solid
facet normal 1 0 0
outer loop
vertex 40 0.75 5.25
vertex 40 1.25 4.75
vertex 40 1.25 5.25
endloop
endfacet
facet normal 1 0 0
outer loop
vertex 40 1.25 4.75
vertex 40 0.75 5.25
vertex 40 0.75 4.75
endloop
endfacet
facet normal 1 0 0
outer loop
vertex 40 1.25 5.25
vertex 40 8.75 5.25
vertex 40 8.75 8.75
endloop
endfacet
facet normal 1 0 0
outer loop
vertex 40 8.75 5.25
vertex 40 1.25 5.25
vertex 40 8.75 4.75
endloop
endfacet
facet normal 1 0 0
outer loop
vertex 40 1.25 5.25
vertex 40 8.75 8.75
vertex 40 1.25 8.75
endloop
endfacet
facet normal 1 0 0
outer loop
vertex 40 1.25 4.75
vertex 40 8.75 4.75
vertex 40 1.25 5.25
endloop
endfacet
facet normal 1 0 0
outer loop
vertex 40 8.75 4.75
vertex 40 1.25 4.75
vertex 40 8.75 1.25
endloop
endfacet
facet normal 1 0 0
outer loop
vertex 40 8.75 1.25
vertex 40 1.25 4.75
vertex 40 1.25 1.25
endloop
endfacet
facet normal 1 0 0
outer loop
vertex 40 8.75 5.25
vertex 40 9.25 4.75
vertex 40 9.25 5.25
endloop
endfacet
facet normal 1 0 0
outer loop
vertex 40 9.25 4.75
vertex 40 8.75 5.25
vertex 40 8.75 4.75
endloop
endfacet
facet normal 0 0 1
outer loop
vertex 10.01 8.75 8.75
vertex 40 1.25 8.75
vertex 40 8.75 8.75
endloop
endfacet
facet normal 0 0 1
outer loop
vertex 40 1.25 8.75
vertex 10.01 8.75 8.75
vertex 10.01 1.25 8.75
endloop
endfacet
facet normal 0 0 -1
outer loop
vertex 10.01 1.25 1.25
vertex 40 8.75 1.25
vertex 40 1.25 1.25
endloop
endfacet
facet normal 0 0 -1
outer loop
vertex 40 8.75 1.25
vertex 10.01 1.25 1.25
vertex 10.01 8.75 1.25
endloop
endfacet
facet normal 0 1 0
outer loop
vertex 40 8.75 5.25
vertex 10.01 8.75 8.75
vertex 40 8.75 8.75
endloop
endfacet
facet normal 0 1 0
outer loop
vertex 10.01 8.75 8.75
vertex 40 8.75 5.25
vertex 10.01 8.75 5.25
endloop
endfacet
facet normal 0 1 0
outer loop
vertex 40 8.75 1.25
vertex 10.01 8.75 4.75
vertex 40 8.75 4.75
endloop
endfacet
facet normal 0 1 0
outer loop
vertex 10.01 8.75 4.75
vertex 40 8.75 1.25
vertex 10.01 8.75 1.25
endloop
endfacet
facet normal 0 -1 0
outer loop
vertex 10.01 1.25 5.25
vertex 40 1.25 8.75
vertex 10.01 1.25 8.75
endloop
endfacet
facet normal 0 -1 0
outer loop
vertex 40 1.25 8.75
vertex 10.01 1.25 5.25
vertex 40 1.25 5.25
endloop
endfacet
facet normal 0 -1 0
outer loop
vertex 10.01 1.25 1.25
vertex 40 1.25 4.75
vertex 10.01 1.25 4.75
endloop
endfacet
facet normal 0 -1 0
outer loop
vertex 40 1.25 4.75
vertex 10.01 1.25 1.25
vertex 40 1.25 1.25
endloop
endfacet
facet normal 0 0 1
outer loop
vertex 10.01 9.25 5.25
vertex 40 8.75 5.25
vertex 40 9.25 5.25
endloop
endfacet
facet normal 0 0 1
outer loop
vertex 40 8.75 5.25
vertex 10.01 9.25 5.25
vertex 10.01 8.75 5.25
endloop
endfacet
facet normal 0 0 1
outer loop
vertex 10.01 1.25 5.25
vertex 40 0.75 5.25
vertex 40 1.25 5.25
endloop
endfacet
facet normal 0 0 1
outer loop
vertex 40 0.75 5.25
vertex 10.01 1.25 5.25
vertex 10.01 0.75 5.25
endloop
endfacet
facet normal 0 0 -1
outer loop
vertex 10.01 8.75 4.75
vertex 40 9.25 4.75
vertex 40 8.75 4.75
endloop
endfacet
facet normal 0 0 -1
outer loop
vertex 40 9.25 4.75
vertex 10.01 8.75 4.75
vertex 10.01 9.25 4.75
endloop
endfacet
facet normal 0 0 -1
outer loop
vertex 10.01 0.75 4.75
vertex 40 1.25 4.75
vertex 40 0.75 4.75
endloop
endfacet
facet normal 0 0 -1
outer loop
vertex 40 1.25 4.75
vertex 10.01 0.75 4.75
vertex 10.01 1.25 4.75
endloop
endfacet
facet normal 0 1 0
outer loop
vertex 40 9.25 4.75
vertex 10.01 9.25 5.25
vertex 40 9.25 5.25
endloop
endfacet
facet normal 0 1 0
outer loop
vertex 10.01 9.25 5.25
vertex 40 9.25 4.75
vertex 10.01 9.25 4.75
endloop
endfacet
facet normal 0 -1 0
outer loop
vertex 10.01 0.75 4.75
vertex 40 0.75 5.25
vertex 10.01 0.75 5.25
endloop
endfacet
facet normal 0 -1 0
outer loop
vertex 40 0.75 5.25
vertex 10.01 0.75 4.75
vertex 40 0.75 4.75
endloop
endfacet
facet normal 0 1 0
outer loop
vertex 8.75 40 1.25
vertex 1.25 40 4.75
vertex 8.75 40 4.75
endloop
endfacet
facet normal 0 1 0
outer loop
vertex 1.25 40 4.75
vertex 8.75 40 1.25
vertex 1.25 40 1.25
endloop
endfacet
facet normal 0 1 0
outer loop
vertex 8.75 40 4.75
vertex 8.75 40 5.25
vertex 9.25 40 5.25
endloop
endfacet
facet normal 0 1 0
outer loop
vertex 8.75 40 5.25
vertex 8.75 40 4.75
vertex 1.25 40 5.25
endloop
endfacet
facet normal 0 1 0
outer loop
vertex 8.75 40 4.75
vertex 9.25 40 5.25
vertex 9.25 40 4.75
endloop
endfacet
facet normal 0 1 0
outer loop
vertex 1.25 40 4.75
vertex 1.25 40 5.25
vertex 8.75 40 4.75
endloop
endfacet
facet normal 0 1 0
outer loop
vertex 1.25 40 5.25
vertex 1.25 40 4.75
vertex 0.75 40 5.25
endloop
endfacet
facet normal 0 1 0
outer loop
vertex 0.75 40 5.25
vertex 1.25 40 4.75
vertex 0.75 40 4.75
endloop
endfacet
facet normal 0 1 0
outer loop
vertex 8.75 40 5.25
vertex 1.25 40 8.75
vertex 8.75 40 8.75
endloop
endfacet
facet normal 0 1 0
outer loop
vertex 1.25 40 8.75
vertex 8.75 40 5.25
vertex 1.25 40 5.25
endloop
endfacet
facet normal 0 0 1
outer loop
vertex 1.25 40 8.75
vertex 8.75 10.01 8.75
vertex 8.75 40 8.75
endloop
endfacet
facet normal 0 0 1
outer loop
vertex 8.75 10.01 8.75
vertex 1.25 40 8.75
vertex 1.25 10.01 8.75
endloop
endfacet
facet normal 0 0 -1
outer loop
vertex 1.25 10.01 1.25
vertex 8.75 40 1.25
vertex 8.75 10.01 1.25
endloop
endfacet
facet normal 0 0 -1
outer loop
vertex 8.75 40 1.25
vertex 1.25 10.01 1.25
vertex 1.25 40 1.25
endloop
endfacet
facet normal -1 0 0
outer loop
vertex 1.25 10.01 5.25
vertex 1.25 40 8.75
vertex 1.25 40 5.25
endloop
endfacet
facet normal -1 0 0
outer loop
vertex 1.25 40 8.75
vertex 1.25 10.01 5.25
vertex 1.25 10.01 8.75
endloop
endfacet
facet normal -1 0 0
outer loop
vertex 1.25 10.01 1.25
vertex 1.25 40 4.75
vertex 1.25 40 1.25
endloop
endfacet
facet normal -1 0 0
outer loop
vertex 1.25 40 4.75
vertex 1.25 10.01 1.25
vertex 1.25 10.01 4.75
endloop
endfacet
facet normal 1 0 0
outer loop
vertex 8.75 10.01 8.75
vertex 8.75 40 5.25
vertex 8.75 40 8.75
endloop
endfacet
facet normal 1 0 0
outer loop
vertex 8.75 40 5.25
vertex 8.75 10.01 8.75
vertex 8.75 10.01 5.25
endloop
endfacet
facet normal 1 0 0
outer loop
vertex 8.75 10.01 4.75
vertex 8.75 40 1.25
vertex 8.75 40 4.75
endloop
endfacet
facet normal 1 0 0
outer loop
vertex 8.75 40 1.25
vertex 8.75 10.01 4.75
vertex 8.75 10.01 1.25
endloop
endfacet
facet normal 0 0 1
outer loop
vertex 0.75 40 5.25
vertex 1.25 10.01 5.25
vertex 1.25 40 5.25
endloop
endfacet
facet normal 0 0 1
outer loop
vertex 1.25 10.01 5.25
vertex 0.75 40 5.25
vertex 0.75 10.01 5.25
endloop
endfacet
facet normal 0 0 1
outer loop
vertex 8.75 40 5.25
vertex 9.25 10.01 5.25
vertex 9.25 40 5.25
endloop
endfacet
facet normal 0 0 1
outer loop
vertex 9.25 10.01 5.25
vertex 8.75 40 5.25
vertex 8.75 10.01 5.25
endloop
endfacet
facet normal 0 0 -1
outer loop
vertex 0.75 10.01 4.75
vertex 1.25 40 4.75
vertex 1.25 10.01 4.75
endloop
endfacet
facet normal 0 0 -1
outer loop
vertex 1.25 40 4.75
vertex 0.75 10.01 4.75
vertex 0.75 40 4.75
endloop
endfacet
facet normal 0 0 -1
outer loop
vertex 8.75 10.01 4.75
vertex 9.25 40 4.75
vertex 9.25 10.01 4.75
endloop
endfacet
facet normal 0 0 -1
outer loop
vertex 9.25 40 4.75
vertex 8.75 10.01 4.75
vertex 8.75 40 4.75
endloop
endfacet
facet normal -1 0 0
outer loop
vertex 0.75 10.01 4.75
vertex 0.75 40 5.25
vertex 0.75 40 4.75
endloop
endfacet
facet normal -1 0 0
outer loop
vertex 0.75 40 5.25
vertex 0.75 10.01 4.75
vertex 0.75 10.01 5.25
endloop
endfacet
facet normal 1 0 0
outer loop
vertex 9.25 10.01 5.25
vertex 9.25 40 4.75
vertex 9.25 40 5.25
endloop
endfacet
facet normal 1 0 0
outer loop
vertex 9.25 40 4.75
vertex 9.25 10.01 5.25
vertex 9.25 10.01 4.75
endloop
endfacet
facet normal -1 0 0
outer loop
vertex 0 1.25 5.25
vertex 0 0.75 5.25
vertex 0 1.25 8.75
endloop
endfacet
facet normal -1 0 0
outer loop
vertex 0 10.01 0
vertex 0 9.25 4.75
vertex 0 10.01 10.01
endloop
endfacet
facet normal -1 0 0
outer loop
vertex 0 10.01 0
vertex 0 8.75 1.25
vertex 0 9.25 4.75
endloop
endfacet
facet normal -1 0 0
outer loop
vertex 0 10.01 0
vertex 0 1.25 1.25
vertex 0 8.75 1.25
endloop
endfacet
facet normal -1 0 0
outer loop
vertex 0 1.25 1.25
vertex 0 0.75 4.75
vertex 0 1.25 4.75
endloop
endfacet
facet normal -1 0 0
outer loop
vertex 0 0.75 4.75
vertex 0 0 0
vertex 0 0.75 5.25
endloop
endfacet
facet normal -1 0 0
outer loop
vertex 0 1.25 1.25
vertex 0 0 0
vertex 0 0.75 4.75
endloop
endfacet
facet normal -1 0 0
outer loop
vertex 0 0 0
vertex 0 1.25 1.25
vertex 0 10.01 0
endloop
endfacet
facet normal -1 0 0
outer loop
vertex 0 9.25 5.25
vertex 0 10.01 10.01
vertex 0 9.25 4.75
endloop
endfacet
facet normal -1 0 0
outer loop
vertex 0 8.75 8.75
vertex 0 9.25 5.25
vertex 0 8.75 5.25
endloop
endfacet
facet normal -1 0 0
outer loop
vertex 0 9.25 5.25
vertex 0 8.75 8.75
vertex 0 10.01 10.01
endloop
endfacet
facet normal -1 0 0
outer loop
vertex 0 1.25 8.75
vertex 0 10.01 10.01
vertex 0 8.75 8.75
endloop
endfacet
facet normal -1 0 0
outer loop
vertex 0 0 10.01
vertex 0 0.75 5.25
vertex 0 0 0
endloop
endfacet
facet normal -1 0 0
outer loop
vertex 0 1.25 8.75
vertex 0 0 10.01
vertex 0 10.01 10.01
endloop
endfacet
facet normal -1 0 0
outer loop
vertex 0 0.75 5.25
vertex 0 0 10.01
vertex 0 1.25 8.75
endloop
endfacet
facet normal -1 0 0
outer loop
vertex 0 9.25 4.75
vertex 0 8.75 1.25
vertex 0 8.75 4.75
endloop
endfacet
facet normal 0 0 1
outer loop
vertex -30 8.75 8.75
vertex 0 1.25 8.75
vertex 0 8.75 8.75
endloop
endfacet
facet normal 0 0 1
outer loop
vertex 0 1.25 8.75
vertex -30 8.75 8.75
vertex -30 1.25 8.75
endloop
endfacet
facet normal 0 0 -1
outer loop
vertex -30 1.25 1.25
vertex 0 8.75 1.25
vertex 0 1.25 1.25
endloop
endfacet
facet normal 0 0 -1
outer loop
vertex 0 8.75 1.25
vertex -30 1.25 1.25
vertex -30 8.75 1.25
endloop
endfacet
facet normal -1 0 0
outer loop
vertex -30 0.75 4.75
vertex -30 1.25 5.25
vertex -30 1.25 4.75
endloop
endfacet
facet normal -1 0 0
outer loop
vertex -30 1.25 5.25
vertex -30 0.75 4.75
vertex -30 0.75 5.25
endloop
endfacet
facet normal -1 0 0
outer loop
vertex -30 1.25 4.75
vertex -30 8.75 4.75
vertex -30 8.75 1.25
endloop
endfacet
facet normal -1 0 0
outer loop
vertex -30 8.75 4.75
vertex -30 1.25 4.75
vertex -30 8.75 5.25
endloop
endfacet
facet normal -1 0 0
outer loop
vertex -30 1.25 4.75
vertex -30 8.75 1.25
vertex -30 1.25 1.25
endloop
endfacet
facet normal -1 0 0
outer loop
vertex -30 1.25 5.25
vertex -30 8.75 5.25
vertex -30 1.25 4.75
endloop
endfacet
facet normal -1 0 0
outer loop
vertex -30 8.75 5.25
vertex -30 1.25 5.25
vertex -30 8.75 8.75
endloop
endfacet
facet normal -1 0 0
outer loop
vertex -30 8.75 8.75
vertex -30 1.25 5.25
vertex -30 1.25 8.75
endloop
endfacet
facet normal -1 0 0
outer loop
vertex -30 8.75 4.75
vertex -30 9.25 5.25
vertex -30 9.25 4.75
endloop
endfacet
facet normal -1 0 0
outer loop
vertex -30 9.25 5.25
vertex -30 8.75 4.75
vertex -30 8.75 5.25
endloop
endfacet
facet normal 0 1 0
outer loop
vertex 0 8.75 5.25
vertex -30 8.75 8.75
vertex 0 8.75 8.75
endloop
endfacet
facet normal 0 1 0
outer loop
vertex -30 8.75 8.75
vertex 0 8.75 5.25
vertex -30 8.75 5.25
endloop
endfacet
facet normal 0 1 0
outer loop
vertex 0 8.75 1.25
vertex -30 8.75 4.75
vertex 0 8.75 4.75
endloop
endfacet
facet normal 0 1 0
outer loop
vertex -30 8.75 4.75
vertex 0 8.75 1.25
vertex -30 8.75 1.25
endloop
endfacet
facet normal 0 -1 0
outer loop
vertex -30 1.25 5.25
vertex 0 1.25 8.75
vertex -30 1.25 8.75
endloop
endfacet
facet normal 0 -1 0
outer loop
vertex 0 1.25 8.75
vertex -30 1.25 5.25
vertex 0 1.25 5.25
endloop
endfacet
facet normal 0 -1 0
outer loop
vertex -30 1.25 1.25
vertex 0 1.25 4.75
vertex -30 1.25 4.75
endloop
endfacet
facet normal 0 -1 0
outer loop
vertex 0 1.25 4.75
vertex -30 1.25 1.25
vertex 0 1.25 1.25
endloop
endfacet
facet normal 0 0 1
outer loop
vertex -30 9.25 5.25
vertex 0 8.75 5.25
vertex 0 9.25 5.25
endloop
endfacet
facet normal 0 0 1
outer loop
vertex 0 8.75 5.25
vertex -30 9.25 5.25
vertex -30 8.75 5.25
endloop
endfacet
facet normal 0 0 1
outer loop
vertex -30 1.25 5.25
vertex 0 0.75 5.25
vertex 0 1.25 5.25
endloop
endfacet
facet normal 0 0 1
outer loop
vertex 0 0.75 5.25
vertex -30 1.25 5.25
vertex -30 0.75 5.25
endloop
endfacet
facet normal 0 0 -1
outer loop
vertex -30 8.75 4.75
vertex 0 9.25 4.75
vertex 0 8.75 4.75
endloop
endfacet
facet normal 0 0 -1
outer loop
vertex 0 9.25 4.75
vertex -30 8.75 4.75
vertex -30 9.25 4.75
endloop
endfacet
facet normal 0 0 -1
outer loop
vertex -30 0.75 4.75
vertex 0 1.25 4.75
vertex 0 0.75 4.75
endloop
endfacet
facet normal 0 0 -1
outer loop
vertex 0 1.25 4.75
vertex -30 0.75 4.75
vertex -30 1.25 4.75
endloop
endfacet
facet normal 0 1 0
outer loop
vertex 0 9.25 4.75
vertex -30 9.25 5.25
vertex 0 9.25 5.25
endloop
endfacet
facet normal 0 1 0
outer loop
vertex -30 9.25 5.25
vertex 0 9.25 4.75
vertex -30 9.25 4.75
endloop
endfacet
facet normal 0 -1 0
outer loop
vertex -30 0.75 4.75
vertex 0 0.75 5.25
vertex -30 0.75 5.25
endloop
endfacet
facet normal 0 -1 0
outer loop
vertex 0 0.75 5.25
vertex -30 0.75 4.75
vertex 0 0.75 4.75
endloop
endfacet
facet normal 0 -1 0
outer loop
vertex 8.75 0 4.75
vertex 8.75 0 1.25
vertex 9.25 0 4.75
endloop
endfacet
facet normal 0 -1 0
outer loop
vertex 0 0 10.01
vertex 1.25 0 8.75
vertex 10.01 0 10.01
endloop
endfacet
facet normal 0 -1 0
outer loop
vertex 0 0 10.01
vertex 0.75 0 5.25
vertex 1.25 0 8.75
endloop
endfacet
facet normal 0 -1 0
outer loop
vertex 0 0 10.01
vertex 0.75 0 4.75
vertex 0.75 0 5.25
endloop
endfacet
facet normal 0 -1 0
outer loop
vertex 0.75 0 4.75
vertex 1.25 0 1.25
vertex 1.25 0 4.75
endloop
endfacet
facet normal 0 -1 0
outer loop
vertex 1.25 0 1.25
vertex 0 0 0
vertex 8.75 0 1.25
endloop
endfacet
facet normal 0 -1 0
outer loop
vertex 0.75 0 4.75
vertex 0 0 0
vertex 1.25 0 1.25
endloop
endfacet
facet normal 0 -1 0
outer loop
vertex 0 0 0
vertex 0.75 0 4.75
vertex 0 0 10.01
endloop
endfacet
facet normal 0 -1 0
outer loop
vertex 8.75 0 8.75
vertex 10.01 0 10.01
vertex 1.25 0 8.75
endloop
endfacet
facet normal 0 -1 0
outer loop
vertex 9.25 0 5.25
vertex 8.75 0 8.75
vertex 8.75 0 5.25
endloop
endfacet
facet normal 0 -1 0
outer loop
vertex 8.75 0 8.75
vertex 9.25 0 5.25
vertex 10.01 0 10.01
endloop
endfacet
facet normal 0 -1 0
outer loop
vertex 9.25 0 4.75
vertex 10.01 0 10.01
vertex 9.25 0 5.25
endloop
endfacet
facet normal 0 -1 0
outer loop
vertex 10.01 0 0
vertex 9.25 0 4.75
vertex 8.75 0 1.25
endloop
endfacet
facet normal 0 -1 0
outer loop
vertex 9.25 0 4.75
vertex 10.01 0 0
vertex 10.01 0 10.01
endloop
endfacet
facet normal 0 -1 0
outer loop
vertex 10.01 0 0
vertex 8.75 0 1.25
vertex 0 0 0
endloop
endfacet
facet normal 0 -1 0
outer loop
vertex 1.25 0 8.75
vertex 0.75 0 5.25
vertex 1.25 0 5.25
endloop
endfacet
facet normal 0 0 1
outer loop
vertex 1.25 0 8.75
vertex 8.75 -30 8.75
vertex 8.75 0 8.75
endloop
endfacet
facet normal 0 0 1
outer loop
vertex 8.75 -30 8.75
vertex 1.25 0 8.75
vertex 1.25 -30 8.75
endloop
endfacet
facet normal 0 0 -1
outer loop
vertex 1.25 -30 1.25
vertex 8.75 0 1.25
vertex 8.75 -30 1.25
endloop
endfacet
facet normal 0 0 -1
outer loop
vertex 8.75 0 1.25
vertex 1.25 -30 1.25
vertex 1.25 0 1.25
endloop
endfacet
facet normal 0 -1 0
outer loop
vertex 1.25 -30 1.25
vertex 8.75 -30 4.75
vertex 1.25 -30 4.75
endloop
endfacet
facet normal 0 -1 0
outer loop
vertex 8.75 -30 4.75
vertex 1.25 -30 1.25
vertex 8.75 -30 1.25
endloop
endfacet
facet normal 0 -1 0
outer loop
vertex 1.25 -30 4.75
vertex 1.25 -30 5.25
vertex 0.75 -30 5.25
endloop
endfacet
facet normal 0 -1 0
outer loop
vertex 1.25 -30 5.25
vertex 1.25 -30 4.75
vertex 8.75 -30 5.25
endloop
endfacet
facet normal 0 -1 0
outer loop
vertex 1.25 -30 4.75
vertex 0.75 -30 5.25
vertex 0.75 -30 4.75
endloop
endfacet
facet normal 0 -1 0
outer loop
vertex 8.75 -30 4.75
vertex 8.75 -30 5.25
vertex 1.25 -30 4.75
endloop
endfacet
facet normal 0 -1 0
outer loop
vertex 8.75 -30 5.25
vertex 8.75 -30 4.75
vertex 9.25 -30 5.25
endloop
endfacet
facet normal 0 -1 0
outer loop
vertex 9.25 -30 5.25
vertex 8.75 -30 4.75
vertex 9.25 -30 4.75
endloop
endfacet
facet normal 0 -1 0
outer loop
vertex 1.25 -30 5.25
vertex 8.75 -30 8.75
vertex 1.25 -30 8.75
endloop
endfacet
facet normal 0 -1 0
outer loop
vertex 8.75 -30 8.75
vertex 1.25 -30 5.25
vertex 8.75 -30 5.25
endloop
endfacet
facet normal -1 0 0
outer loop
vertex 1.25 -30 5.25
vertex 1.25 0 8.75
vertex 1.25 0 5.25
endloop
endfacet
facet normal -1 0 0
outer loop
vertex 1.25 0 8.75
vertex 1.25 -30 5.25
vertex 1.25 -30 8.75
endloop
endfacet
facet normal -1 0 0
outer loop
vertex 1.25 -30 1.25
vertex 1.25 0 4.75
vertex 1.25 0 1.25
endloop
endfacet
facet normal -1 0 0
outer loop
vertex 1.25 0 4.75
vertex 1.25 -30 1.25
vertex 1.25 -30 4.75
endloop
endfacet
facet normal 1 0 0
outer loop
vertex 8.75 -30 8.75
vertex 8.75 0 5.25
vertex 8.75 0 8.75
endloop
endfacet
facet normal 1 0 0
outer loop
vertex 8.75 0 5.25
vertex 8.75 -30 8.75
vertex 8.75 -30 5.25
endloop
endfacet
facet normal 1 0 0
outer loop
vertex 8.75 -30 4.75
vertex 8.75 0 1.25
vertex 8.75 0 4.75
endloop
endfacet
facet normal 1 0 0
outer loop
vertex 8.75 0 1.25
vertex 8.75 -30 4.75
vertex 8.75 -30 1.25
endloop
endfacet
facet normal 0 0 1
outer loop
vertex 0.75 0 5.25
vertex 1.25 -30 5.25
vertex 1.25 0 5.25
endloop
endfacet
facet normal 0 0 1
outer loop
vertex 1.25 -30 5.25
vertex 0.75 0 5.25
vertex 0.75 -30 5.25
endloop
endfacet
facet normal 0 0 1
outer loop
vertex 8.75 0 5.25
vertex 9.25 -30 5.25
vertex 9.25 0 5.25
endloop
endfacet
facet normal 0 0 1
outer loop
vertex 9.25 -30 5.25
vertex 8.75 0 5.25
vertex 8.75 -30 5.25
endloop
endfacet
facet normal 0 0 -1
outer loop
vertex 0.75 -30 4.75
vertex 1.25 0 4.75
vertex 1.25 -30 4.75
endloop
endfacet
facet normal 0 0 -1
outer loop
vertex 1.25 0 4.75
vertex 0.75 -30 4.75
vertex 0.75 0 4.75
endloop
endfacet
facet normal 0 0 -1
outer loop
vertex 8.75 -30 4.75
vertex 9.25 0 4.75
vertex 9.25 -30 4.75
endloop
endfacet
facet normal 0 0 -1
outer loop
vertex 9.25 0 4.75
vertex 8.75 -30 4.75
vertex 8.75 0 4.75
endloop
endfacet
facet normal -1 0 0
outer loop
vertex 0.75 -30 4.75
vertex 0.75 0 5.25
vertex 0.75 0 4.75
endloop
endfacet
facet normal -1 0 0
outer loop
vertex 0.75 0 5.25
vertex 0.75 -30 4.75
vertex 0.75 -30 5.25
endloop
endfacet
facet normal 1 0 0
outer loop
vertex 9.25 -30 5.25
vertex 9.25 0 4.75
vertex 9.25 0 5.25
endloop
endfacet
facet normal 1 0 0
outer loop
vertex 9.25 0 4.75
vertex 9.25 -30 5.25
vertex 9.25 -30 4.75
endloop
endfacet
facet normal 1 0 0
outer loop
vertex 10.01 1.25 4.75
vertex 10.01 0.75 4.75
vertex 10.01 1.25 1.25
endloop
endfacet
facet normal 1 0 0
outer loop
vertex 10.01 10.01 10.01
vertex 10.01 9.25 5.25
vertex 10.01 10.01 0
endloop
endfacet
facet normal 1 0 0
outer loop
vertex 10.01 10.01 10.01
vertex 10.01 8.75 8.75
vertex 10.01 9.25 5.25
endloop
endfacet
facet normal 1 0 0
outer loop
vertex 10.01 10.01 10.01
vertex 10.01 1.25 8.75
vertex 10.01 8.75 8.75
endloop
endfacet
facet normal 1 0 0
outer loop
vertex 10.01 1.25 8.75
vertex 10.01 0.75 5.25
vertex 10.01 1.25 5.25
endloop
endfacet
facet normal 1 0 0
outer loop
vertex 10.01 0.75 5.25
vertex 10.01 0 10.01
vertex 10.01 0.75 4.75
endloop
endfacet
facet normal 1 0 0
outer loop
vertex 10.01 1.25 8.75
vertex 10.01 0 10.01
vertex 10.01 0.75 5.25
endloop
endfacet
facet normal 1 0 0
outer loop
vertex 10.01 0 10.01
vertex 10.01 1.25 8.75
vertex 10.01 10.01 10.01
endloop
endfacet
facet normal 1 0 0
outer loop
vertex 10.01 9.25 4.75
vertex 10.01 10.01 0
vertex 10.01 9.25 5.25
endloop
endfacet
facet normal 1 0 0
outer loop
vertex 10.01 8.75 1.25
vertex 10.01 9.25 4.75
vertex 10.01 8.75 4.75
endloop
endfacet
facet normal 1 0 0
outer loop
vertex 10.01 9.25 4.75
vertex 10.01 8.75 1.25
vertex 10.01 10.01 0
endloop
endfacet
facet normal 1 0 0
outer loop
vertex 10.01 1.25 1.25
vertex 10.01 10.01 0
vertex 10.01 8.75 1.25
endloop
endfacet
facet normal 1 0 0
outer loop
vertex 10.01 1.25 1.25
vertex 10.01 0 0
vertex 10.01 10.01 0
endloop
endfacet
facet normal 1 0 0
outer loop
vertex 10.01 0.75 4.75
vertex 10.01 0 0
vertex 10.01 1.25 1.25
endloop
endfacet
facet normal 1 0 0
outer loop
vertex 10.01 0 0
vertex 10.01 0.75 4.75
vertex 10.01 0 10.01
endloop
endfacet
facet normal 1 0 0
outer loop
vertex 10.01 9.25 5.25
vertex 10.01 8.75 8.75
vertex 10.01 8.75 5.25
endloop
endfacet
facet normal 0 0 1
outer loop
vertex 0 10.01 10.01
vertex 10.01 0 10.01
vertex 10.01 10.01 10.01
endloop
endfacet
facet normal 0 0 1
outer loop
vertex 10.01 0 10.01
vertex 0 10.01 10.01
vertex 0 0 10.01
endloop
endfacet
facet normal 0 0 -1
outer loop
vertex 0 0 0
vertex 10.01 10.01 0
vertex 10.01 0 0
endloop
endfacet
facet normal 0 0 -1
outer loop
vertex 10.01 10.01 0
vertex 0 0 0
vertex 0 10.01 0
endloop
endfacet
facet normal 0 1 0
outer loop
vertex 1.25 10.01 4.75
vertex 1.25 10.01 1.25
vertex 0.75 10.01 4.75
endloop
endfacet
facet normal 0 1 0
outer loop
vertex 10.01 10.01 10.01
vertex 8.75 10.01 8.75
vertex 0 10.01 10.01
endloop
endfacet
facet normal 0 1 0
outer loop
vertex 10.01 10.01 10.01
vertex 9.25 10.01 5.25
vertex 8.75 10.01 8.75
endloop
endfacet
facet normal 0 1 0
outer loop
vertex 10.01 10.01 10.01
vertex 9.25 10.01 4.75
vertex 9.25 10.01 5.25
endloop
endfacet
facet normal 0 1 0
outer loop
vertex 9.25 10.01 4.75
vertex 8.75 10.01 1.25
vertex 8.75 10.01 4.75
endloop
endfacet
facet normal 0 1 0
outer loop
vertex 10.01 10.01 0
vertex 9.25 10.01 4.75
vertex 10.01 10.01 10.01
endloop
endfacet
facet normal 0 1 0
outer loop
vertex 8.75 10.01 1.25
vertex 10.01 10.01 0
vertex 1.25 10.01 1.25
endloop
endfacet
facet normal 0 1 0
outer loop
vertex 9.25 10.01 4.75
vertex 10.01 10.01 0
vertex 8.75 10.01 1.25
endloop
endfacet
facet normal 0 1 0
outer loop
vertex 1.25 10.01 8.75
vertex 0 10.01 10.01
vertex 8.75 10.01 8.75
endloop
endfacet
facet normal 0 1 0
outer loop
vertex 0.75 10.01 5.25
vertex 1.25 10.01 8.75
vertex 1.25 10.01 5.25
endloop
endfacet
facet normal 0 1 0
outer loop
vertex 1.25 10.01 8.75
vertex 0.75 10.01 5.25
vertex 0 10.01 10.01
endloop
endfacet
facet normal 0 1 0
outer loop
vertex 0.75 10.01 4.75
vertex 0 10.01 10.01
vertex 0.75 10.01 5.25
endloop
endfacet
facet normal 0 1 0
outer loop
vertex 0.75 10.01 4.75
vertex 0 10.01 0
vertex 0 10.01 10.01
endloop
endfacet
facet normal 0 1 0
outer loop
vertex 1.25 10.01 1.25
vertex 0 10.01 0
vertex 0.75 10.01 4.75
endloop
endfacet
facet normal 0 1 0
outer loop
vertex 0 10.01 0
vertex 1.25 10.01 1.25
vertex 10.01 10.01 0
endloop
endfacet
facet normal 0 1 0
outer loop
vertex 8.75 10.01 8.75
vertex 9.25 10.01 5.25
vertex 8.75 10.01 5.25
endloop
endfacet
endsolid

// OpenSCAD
// Set lenght of the legs in mm
lengte = 30;

// Set size of inner dimension in mm
binnenzijde = 7.5;

// Set size of outer dimension in mm
buitenzijde = 10;

// Set size of wall thickness in mm
wand = 1;

// Set height of break lines in mm
hulplijn = 0.5;

// Set variant
variant = 5; // [1:End Piece, 2:Extension, 3:Corner, 4:T, 5:Cross]

module poot(l, b, h)
{
	cube([l,b,b]);
	color("blue")translate([0,-h,b/2-h/2]) cube([l,b+h*2,0.5]);

}

color("red")cube(buitenzijde+0.01);
translate([buitenzijde,(buitenzijde-binnenzijde)/2,(buitenzijde-binnenzijde)/2])poot(lengte, binnenzijde, hulplijn);

if (variant > 2)
{
	translate([10 - (buitenzijde-binnenzijde)/2,buitenzijde,(buitenzijde-binnenzijde)/2])rotate([0,0,90])poot(lengte, binnenzijde, hulplijn);
}

if (variant == 2 || variant > 3)
{
	translate([-lengte,(buitenzijde-binnenzijde)/2,(buitenzijde-binnenzijde)/2])poot(lengte, binnenzijde, hulplijn);
}

if (variant == 5)
{
	translate([10 - (buitenzijde-binnenzijde)/2,-lengte,(buitenzijde-binnenzijde)/2])rotate([0,0,90])poot(lengte, binnenzijde, hulplijn);
}
